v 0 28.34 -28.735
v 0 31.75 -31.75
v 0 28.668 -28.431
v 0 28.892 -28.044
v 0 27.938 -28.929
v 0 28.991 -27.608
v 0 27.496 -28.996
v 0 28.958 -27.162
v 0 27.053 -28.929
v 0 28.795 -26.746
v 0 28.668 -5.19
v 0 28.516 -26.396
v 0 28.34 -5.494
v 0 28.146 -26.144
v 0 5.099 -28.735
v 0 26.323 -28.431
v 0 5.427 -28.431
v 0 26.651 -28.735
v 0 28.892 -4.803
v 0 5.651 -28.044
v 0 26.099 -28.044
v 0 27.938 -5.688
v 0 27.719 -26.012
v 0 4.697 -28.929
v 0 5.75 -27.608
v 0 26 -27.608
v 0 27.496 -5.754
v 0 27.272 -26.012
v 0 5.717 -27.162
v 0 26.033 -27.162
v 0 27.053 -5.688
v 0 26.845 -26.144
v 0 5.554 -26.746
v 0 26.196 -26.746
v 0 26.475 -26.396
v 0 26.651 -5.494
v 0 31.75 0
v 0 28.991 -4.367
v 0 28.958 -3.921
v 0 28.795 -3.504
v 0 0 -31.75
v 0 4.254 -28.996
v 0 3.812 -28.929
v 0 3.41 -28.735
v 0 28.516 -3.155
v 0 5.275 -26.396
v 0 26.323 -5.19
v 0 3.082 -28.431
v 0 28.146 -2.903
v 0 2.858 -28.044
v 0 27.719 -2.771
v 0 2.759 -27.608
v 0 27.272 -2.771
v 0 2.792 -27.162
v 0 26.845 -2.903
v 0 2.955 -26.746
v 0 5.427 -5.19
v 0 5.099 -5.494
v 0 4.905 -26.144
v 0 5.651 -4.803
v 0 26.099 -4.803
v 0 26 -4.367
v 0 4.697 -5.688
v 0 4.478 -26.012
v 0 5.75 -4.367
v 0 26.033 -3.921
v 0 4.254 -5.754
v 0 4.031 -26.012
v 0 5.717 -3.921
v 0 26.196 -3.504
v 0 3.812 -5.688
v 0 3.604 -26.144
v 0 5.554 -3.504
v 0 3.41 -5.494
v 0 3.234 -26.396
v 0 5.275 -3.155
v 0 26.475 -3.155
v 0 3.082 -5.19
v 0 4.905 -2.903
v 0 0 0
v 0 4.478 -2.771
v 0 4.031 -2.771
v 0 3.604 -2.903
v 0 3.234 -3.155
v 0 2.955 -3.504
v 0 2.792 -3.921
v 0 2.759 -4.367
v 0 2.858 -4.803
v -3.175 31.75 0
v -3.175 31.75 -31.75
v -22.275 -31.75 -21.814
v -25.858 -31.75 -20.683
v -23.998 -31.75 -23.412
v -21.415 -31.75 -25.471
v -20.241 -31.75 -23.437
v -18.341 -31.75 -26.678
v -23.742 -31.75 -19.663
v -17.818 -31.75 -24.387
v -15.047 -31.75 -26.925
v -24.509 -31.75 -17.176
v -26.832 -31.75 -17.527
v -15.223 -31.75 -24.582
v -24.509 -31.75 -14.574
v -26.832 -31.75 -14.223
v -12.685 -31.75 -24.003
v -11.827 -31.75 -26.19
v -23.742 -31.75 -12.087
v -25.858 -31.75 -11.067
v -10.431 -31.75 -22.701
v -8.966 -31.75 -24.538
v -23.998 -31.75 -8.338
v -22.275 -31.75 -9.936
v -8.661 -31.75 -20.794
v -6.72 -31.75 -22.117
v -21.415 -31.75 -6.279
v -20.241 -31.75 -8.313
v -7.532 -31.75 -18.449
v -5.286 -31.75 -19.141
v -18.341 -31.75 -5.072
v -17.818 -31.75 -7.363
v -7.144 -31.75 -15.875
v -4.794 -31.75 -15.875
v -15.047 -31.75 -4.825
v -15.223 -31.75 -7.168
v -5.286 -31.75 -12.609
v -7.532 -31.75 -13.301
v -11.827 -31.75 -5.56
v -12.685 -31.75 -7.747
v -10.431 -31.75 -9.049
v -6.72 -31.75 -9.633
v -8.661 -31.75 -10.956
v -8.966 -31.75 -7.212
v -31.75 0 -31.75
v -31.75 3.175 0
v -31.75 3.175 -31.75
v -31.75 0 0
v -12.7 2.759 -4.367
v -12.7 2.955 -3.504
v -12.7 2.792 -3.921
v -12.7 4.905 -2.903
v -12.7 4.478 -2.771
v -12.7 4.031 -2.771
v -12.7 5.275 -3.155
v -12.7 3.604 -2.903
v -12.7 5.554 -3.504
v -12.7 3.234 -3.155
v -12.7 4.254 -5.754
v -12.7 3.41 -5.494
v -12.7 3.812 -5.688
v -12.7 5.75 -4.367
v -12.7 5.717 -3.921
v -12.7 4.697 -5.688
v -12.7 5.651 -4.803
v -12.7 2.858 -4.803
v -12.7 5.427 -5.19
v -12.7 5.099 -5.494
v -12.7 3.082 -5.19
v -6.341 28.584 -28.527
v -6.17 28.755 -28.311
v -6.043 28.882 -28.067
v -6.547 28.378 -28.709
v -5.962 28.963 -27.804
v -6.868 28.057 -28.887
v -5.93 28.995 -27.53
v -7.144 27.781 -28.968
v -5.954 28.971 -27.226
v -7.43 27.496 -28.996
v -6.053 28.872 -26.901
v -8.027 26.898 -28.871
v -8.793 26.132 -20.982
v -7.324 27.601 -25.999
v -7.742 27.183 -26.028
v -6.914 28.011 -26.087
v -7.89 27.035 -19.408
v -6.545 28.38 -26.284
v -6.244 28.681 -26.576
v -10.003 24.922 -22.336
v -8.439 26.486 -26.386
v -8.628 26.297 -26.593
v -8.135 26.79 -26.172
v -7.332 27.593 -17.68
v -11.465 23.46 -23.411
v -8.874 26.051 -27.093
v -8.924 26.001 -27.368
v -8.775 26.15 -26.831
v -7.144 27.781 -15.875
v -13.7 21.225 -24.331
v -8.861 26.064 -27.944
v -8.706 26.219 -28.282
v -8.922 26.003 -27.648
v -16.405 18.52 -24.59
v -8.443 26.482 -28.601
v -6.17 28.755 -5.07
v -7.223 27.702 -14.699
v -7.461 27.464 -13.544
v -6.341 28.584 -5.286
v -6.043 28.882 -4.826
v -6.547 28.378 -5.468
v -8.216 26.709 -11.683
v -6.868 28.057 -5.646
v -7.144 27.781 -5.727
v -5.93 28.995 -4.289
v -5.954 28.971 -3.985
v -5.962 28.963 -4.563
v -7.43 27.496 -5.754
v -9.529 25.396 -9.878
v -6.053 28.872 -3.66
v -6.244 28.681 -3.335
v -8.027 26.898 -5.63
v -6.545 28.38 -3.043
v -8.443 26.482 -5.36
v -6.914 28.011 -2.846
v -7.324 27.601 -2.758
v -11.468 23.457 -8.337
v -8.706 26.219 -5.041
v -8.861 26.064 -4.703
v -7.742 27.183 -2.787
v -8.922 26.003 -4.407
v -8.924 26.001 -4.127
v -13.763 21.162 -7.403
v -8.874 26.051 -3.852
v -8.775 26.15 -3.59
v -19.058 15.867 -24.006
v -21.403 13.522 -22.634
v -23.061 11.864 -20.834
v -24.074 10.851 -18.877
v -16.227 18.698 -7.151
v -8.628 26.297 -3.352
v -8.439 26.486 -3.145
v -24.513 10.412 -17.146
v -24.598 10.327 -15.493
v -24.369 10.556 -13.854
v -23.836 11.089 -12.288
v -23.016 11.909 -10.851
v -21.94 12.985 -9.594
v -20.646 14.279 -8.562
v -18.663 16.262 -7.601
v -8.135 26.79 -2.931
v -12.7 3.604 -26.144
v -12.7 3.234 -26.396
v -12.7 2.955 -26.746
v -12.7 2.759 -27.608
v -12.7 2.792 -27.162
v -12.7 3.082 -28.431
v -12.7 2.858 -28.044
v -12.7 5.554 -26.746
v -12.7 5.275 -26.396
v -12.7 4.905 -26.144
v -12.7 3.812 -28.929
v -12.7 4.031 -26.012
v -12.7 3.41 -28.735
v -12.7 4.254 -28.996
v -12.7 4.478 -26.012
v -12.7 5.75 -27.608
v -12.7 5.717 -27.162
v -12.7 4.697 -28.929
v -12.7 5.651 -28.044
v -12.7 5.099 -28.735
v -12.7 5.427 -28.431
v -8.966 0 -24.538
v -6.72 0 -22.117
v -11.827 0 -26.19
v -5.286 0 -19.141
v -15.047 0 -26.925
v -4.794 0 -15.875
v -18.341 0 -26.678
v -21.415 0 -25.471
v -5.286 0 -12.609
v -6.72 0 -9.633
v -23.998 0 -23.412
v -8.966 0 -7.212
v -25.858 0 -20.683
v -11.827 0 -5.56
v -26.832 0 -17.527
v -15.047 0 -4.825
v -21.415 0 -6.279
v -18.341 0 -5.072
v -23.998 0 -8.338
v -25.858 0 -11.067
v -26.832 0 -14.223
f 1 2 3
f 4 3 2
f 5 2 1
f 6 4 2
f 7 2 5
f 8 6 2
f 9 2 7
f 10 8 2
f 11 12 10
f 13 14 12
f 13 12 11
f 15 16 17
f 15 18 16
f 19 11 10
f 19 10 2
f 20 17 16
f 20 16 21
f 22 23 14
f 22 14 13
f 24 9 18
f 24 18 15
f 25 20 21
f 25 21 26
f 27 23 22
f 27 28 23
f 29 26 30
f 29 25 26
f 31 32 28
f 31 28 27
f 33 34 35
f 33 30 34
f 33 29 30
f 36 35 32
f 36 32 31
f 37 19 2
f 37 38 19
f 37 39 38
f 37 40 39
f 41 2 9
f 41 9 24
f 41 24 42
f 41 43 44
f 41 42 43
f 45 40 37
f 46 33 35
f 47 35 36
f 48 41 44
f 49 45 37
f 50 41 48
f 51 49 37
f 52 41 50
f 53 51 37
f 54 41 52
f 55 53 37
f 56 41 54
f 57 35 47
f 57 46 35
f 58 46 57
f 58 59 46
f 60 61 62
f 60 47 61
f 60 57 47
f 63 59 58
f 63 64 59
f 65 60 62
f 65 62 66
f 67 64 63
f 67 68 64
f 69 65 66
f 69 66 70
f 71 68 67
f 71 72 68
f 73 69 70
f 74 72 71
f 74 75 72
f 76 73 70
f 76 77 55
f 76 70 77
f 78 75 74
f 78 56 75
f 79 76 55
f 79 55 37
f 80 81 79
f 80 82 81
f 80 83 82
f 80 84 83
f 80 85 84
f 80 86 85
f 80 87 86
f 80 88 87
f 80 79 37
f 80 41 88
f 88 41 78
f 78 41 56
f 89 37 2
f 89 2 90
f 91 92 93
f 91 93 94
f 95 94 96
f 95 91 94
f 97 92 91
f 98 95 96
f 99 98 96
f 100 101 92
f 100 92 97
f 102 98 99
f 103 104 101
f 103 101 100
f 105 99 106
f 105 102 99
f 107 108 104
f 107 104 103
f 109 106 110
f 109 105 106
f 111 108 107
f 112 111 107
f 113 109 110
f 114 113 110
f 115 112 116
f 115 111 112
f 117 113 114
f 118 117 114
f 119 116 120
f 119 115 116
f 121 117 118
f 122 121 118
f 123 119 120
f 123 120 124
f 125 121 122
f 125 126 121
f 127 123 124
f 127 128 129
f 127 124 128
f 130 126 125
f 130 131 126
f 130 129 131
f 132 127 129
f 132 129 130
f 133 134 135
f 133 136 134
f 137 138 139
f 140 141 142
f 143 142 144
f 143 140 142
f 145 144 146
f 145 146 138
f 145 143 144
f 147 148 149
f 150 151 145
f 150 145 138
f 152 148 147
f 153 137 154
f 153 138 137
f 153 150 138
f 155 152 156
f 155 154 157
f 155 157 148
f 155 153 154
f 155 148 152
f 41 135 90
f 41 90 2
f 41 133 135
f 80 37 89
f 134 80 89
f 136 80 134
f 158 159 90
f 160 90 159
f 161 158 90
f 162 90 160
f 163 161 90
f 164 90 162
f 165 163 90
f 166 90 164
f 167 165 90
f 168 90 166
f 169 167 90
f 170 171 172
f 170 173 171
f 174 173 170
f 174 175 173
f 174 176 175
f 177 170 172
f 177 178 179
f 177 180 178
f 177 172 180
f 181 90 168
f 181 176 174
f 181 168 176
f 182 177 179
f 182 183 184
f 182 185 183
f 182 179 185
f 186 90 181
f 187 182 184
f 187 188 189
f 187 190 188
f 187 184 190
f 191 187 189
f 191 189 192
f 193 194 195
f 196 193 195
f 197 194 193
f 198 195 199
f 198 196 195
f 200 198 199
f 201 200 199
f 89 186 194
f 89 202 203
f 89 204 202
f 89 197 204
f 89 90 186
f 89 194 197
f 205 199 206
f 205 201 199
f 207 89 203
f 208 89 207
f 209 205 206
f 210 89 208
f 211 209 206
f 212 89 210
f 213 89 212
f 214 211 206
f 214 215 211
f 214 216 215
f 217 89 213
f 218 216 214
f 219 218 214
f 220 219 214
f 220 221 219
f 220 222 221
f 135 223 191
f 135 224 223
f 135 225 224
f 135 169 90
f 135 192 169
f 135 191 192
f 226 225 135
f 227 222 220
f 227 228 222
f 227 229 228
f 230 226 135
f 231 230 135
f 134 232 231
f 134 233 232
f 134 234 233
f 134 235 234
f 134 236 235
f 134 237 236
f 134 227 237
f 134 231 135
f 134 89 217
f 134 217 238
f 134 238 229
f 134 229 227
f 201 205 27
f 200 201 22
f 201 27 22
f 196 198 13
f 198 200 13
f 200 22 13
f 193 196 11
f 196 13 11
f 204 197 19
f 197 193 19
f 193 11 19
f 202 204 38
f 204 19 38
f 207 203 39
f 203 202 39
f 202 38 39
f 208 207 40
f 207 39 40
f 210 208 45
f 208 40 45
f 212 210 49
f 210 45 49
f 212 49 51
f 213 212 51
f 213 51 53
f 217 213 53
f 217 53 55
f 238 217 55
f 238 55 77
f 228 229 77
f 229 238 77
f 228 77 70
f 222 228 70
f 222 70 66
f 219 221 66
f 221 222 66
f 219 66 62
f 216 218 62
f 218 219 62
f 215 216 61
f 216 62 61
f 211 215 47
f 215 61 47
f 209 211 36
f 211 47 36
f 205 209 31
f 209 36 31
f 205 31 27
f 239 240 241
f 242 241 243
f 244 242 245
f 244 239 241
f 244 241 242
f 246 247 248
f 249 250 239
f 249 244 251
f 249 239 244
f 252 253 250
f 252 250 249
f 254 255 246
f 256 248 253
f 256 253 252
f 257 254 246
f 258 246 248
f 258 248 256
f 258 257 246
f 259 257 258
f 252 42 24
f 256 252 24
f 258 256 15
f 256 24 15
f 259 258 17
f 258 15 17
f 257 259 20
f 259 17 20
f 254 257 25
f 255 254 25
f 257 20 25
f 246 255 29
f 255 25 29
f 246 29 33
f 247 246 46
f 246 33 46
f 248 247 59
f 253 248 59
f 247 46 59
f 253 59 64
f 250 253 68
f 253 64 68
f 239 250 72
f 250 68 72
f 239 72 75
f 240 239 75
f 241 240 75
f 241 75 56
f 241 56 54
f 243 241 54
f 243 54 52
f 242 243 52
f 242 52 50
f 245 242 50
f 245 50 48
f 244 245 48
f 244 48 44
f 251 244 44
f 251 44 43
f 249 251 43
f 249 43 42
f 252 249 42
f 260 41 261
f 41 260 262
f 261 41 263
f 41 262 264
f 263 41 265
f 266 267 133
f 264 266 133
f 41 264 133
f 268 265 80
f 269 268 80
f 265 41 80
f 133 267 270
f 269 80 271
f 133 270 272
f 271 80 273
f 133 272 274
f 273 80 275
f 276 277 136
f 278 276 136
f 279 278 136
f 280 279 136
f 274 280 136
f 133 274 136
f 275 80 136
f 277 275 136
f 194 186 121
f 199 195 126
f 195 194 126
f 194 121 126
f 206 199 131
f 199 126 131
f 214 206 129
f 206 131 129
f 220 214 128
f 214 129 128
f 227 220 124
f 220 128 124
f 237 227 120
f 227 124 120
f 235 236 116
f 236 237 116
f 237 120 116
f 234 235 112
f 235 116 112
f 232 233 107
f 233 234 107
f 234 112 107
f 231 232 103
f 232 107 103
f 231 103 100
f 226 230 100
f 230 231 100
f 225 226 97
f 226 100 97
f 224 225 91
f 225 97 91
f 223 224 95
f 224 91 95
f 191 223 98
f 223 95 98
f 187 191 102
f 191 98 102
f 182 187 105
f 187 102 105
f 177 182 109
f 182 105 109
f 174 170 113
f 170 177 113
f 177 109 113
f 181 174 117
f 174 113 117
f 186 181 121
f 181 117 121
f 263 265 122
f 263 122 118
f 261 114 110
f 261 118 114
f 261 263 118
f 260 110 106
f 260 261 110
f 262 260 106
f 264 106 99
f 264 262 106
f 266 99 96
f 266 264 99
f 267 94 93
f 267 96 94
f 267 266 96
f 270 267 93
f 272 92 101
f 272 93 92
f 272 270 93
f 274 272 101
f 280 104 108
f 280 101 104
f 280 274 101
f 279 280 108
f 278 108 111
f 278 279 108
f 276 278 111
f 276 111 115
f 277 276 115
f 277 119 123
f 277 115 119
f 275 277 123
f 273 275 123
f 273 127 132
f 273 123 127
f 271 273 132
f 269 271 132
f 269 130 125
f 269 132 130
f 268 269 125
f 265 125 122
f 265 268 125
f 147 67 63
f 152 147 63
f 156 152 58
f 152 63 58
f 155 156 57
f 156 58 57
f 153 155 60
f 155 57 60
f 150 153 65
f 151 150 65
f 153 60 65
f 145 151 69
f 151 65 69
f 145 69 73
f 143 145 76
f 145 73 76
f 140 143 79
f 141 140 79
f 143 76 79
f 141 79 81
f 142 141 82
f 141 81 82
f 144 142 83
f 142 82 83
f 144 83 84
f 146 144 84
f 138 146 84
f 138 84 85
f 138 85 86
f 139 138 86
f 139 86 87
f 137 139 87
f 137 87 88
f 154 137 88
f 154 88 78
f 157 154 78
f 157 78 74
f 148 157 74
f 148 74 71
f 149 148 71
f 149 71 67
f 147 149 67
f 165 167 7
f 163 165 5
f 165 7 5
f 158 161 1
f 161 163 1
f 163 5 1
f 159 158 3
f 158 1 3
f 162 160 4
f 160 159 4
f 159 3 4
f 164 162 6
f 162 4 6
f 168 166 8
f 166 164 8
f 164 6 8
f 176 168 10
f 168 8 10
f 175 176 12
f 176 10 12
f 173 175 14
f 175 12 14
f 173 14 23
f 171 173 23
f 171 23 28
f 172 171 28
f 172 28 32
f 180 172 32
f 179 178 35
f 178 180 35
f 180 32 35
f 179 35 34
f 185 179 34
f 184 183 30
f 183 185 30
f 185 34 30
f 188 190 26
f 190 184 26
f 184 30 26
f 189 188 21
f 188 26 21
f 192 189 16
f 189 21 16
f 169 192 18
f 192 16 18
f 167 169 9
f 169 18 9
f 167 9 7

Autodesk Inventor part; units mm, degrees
ref_plane "YZ Plane" through (0, 0, 0) normal (1, 0, 0) x (0, 1, 0)
ref_plane "XZ Plane" through (0, 0, 0) normal (0, 1, 0) x (-1, 0, 0)
ref_plane "XY Plane" through (0, 0, 0) normal (0, 0, 1) x (1, 0, 0)
sketch "Sketch2" plane through (0, 0, 0) normal (0, 1, 0) x (-1, 0, 0)
  line L0 (0, 0) -> (31.75, 0)
  line L1 (31.75, 0) -> (31.75, -31.75)
  line L2 (31.75, -31.75) -> (0, -31.75)
  line L3 (0, -31.75) -> (0, 0)
  dimension "d0" = 31.75
  dimension "d1" = 31.75
extrude "Extrusion1" add sketch "Sketch2" along normal blind 31.75
sketch "Sketch3" plane through (-31.75, 0, 0) normal (0, 0, 1) x (1, 0, 0)
  line L0 (0, 31.75) -> (31.75, 31.75) projected
  line L1 (28.575, 31.75) -> (0, 3.175)
  line L2 (0, 0) -> (0, 31.75) projected
  line L3 (28.575, 31.75) -> (68.9862, 31.75) construction
  line L4 (0, 0) -> (0, 31.75) projected
  line L5 (0, 31.75) -> (14.2875, 17.4625) construction
  point P0 (31.75, 0)
  dimension "d4" = 135
  dimension "d25" = 3.175
  dimension "d26" = 20.2056
extrude "Extrusion2" cut sketch "Sketch3" against normal blind 38.1
sketch "Sketch4" plane through (0, 0, 0) normal (0, -1, 0) x (1, 0, 0)
  line L0 (-31.75, 0) -> (0, -31.75) construction
  circle A0 centre (-15.875, -15.875) radius 11.0808
  point P0 (0, 0)
  dimension "d7" = 22.1615
extrude "Extrusion3" add sketch "Sketch4" along normal blind 31.75
sketch "Sketch5" plane through (-15.875, -31.75, -15.875) normal (0, -1, 0) x (1, 0, 0)
  circle A0 centre (0, 0) radius 8.7313
  circle A1 centre (0, 0) radius 11.0808 projected
  point P0 (15.875, 15.875)
  dimension "d35" = 17.4625
extrude "Extrusion4" cut sketch "Sketch5" against normal through all contours A0
sketch "Sketch6" plane through (0, 0, 0) normal (1, 0, 0) x (0, 0, -1)
  line L0 (0, 31.75) -> (31.75, 0) construction
  line L1 (4.2545, 4.2545) -> (27.4955, 4.2545) construction
  line L2 (27.4955, 4.2545) -> (27.4955, 27.4955) construction
  line L3 (27.4955, 27.4955) -> (4.2545, 27.4955) construction
  line L4 (4.2545, 27.4955) -> (4.2545, 4.2545) construction
  line L5 (4.2545, 4.2545) -> (27.4955, 27.4955) construction
  line L6 (27.4955, 4.2545) -> (4.2545, 27.4955) construction
  circle A0 centre (4.2545, 27.4955) radius 1.5
  circle A1 centre (4.2545, 4.2545) radius 1.5
  circle A2 centre (27.4955, 4.2545) radius 1.5
  circle A3 centre (27.4955, 27.4955) radius 1.5
  line L7 (0, 31.75) -> (31.75, 31.75) projected
  point P0 (0, 0)
  point P1 (15.875, 15.875)
  dimension "d15" = 23.241
  dimension "d16" = 23.241
  dimension "d17" = 3
  dimension "d20" = 360
  dimension "d24" = 4.2545
extrude "Extrusion5" cut sketch "Sketch6" against normal blind 12.7
thread "Thread1" size "M3x0.5" class "6H" standard "ANSI Metric M Profile" full length
thread "Thread2" size "M3x0.5" class "6H" standard "ANSI Metric M Profile" full length
thread "Thread3" size "M3x0.5" class "6H" standard "ANSI Metric M Profile" full length
thread "Thread4" size "M3x0.5" class "6H" standard "ANSI Metric M Profile" full length
properties part number "motormount" material "Aluminum 6061"
